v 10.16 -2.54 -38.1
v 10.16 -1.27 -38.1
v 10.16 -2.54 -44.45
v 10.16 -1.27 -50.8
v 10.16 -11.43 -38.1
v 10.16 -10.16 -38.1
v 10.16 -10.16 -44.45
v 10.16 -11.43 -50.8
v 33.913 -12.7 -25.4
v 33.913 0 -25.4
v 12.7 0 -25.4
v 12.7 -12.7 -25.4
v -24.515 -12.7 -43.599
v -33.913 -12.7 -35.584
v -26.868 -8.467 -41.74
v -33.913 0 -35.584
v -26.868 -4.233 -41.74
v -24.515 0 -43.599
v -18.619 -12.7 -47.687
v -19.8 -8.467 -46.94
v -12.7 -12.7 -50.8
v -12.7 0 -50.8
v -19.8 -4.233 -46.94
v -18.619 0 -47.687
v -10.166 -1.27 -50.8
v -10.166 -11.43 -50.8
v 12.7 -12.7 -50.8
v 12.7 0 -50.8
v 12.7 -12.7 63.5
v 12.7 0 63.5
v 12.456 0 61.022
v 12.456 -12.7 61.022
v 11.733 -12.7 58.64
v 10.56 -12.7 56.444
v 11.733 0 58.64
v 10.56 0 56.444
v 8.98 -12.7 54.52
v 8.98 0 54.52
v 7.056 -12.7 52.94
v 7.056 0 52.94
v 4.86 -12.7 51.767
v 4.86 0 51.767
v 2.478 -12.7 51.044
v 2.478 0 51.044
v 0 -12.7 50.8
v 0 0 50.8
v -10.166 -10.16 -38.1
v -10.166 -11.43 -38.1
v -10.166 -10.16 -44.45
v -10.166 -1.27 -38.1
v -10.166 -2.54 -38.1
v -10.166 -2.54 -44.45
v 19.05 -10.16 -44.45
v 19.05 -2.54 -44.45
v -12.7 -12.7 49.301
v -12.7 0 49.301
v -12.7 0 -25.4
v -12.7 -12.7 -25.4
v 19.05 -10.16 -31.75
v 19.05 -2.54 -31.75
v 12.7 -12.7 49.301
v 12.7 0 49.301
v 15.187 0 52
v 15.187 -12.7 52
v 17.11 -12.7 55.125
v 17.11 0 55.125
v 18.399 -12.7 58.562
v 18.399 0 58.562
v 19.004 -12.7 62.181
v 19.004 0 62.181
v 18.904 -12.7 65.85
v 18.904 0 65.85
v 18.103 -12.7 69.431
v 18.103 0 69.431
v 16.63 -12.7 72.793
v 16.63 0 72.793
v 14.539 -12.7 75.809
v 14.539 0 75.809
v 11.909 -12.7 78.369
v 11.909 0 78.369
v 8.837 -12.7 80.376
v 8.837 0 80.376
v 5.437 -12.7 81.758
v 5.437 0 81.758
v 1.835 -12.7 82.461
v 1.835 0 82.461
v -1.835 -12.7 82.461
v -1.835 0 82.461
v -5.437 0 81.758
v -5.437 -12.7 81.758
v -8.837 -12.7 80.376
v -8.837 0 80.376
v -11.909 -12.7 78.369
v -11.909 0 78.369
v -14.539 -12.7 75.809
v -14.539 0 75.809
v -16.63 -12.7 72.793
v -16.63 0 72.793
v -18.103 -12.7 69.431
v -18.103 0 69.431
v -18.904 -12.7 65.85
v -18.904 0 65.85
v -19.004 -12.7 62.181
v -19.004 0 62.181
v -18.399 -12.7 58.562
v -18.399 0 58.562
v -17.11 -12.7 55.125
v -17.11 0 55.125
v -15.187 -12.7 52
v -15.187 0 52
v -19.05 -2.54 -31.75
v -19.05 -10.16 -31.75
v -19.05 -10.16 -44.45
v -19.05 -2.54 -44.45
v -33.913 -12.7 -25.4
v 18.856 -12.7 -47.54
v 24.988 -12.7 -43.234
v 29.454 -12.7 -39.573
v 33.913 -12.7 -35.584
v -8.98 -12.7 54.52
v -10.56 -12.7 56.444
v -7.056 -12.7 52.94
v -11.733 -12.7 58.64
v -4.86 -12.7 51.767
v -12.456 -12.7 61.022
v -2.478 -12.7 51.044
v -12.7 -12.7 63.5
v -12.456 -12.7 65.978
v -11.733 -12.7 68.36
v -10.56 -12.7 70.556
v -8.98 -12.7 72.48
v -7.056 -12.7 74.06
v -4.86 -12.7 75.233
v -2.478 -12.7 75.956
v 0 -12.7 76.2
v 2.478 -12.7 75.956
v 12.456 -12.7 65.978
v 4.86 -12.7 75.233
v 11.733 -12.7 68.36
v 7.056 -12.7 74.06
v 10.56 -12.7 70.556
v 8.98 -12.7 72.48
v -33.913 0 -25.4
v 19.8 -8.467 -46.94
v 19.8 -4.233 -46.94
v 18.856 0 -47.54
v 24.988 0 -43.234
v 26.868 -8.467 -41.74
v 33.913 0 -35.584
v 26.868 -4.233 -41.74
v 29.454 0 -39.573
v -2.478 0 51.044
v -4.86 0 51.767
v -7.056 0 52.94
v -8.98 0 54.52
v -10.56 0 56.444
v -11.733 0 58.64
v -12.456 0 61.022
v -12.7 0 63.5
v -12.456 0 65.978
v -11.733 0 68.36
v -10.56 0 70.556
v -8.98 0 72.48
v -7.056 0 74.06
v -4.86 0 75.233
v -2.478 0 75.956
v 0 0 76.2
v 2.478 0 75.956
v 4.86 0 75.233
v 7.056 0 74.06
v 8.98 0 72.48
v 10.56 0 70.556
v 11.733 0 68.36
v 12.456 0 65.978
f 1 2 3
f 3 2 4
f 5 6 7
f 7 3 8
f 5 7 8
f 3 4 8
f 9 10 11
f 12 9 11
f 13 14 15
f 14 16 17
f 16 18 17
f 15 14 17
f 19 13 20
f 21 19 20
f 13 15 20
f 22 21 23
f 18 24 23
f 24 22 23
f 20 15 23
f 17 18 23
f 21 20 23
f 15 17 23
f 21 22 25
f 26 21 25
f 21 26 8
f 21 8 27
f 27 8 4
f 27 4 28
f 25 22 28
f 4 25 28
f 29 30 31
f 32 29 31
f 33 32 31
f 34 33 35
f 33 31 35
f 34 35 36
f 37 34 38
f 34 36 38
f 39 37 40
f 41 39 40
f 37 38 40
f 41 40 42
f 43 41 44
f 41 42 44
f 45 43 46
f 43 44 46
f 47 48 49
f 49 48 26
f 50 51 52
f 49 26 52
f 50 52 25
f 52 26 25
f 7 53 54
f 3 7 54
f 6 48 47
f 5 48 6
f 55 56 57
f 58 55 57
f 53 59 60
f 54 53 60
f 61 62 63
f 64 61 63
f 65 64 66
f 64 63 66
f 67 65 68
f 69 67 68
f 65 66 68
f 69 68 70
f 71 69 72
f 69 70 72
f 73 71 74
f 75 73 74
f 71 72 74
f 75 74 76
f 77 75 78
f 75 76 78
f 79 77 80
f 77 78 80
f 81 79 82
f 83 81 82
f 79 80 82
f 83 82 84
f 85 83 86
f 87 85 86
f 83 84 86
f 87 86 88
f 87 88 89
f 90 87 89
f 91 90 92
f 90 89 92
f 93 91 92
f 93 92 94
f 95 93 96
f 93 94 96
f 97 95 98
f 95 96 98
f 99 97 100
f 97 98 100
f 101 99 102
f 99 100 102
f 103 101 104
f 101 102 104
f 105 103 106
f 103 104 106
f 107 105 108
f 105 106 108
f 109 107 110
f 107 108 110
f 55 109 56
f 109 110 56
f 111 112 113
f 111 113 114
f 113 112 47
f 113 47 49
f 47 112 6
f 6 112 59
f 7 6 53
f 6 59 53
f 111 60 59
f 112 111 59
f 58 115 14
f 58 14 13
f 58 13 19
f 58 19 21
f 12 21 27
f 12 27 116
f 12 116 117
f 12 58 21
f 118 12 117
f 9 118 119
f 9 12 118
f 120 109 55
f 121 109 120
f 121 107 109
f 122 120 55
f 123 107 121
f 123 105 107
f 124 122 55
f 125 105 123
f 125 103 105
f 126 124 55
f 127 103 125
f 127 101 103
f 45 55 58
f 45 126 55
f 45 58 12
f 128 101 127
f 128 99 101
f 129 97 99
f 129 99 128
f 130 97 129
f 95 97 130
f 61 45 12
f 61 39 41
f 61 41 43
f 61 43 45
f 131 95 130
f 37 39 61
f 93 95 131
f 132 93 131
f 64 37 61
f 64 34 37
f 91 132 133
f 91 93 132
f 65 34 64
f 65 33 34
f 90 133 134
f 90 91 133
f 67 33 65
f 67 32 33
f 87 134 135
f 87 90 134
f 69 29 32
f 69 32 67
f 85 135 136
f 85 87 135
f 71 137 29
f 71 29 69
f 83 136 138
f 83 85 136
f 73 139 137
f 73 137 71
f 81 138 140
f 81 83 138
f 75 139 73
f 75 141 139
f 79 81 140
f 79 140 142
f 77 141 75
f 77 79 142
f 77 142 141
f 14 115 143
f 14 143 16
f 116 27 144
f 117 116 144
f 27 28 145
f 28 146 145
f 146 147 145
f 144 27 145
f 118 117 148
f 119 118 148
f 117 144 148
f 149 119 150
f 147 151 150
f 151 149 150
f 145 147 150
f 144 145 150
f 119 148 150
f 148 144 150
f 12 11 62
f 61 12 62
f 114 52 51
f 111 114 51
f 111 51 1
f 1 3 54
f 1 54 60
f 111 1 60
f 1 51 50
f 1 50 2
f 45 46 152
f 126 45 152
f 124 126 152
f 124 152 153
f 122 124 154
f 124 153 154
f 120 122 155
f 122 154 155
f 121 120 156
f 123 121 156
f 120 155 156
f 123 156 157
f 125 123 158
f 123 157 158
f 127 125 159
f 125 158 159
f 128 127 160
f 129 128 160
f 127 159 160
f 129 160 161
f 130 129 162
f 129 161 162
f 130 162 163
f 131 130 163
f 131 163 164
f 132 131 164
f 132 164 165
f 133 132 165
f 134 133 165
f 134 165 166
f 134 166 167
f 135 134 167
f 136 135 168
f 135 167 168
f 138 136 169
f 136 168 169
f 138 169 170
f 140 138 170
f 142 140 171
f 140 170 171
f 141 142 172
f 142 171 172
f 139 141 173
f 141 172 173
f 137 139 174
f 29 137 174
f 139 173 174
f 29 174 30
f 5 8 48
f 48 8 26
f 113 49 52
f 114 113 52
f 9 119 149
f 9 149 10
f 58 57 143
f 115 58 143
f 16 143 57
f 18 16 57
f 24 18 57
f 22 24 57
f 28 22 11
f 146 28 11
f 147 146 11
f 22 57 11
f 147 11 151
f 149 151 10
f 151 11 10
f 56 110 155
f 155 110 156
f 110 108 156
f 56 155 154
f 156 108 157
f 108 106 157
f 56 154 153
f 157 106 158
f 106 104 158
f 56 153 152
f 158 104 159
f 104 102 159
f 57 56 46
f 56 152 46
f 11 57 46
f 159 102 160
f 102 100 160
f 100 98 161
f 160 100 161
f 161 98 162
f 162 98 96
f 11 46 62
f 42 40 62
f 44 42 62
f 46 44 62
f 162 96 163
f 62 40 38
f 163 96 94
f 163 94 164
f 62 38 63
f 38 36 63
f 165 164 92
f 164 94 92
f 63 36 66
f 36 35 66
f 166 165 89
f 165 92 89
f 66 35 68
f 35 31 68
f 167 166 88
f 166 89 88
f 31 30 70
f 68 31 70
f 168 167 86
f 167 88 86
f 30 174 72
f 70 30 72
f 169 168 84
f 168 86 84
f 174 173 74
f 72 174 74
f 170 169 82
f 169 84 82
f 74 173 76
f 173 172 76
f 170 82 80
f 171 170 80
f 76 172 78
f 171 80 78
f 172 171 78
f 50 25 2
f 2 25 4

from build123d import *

# Parameters (mm, degrees)
F1_DEPTH      = 12.7
F3_DEPTH      = 19.05
F3_DEPTH_BACK = 19.05
F5_DEPTH      = 12.7


# Not quite as in the source:
# - a feature names something its author has since deleted; it is built from what else it names


with BuildPart() as f1:
    # F0 (on Front) → F1 (new body)
    with BuildSketch(Plane.XZ):
        with BuildLine():
            Line((-12.7, 0), (0, 0))
            Line((0, 0), (12.7, 0))
            Line((12.7, 0), (12.7, 49.3009683429))
            ThreePointArc((12.7, 49.3009683429), (0, 44.45), (-12.7, 49.3009683429))
            Line((-12.7, 49.3009683429), (-12.7, 0))
        make_face()
        Polygon((12.7, 0), (0, 0), (-12.7, 0), (-12.7, -25.4), (0, -25.4), (12.7, -25.4), align=None)
        with BuildLine():
            ThreePointArc((-12.7, 49.3009683429), (0, 44.45), (12.7, 49.3009683429))
            Line((12.7, 49.3009683429), (12.7, 50.8))
            Line((12.7, 50.8), (0, 50.8))
            Line((0, 50.8), (-12.7, 50.8))
            Line((-12.7, 50.8), (-12.7, 49.3009683429))
        make_face()
        with BuildLine():
            Line((12.7, 50.8), (12.7, 49.3009683429))
            ThreePointArc((12.7, 49.3009683429), (17.3901912008, 55.7228700667), (19.05, 63.5))
            ThreePointArc((19.05, 63.5), (13.4703841816, 76.9703841816), (0, 82.55))
            ThreePointArc((0, 82.55), (-17.7959834382, 70.2974608102), (-12.7, 49.3009683429))
            Line((-12.7, 49.3009683429), (-12.7, 50.8))
            Line((-12.7, 50.8), (0, 50.8))
            Line((0, 50.8), (12.7, 50.8))
        make_face()
        with BuildLine():
            ThreePointArc((12.7, 63.5), (8.9802561211, 54.5197438789), (0, 50.8))
            ThreePointArc((0, 50.8), (-8.9802561211, 72.4802561211), (12.7, 63.5))
        make_face(mode=Mode.SUBTRACT)
        with BuildLine():
            Line((33.9128470637, -25.4), (12.7, -25.4))
            Line((12.7, -25.4), (12.7, -50.8))
            add(Edge.make_bspline(
                [(12.7, -50.8), (19.8188597647, -47.7374133591), (26.8761157229, -42.0909685678), (33.9128470637, -35.5836565254)],
                knots=[0.6416254251, 0.6416254251, 0.6416254251, 0.6416254251, 0.8805998947, 0.8805998947, 0.8805998947, 0.8805998947], degree=3))
            Line((33.9128470637, -35.5836565254), (33.9128470637, -25.4))
        make_face()
        Polygon((12.7, -50.8), (12.7, -25.4), (0, -25.4), (-12.7, -25.4), (-12.7, -50.8), align=None)
        with BuildLine():
            Line((-12.7, -50.8), (-12.7, -25.4))
            Line((-12.7, -25.4), (-33.9128470637, -25.4))
            Line((-33.9128470637, -25.4), (-33.9128470637, -35.5836565254))
            add(Edge.make_bspline(
                [(-33.9128470637, -35.5836565254), (-26.8761157229, -42.0909685678), (-19.8188597647, -47.7374133591), (-12.7, -50.8)],
                knots=[0.1194001053, 0.1194001053, 0.1194001053, 0.1194001053, 0.3583745749, 0.3583745749, 0.3583745749, 0.3583745749], degree=3))
        make_face()
    extrude(amount=F1_DEPTH)

    # F2 (on Right) → F3 (cut, two sides)
    with BuildSketch(Plane.YZ) as f3_sk:
        Polygon((-7.62, -31.75), (-10.16, -31.75), (-10.16, -44.45), (-5.08, -44.45), (-2.54, -44.45), (-2.54, -31.75), (-5.08, -31.75), align=None)
    extrude(amount=-F3_DEPTH, mode=Mode.SUBTRACT)
    extrude(f3_sk.sketch, amount=F3_DEPTH_BACK, mode=Mode.SUBTRACT)

    # F4 (on face) → F5 (cut)
    with BuildSketch(Plane(origin=(0, 0, -50.8), x_dir=(1, 0, 0), z_dir=(0, 0, -1))):
        Polygon((-10.1655442268, 1.27), (0, 1.27), (10.16, 1.27), (10.16, 11.43), (0, 11.43), (-10.1655442268, 11.43), align=None)
    extrude(amount=-F5_DEPTH, mode=Mode.SUBTRACT)


solid = f1.part
